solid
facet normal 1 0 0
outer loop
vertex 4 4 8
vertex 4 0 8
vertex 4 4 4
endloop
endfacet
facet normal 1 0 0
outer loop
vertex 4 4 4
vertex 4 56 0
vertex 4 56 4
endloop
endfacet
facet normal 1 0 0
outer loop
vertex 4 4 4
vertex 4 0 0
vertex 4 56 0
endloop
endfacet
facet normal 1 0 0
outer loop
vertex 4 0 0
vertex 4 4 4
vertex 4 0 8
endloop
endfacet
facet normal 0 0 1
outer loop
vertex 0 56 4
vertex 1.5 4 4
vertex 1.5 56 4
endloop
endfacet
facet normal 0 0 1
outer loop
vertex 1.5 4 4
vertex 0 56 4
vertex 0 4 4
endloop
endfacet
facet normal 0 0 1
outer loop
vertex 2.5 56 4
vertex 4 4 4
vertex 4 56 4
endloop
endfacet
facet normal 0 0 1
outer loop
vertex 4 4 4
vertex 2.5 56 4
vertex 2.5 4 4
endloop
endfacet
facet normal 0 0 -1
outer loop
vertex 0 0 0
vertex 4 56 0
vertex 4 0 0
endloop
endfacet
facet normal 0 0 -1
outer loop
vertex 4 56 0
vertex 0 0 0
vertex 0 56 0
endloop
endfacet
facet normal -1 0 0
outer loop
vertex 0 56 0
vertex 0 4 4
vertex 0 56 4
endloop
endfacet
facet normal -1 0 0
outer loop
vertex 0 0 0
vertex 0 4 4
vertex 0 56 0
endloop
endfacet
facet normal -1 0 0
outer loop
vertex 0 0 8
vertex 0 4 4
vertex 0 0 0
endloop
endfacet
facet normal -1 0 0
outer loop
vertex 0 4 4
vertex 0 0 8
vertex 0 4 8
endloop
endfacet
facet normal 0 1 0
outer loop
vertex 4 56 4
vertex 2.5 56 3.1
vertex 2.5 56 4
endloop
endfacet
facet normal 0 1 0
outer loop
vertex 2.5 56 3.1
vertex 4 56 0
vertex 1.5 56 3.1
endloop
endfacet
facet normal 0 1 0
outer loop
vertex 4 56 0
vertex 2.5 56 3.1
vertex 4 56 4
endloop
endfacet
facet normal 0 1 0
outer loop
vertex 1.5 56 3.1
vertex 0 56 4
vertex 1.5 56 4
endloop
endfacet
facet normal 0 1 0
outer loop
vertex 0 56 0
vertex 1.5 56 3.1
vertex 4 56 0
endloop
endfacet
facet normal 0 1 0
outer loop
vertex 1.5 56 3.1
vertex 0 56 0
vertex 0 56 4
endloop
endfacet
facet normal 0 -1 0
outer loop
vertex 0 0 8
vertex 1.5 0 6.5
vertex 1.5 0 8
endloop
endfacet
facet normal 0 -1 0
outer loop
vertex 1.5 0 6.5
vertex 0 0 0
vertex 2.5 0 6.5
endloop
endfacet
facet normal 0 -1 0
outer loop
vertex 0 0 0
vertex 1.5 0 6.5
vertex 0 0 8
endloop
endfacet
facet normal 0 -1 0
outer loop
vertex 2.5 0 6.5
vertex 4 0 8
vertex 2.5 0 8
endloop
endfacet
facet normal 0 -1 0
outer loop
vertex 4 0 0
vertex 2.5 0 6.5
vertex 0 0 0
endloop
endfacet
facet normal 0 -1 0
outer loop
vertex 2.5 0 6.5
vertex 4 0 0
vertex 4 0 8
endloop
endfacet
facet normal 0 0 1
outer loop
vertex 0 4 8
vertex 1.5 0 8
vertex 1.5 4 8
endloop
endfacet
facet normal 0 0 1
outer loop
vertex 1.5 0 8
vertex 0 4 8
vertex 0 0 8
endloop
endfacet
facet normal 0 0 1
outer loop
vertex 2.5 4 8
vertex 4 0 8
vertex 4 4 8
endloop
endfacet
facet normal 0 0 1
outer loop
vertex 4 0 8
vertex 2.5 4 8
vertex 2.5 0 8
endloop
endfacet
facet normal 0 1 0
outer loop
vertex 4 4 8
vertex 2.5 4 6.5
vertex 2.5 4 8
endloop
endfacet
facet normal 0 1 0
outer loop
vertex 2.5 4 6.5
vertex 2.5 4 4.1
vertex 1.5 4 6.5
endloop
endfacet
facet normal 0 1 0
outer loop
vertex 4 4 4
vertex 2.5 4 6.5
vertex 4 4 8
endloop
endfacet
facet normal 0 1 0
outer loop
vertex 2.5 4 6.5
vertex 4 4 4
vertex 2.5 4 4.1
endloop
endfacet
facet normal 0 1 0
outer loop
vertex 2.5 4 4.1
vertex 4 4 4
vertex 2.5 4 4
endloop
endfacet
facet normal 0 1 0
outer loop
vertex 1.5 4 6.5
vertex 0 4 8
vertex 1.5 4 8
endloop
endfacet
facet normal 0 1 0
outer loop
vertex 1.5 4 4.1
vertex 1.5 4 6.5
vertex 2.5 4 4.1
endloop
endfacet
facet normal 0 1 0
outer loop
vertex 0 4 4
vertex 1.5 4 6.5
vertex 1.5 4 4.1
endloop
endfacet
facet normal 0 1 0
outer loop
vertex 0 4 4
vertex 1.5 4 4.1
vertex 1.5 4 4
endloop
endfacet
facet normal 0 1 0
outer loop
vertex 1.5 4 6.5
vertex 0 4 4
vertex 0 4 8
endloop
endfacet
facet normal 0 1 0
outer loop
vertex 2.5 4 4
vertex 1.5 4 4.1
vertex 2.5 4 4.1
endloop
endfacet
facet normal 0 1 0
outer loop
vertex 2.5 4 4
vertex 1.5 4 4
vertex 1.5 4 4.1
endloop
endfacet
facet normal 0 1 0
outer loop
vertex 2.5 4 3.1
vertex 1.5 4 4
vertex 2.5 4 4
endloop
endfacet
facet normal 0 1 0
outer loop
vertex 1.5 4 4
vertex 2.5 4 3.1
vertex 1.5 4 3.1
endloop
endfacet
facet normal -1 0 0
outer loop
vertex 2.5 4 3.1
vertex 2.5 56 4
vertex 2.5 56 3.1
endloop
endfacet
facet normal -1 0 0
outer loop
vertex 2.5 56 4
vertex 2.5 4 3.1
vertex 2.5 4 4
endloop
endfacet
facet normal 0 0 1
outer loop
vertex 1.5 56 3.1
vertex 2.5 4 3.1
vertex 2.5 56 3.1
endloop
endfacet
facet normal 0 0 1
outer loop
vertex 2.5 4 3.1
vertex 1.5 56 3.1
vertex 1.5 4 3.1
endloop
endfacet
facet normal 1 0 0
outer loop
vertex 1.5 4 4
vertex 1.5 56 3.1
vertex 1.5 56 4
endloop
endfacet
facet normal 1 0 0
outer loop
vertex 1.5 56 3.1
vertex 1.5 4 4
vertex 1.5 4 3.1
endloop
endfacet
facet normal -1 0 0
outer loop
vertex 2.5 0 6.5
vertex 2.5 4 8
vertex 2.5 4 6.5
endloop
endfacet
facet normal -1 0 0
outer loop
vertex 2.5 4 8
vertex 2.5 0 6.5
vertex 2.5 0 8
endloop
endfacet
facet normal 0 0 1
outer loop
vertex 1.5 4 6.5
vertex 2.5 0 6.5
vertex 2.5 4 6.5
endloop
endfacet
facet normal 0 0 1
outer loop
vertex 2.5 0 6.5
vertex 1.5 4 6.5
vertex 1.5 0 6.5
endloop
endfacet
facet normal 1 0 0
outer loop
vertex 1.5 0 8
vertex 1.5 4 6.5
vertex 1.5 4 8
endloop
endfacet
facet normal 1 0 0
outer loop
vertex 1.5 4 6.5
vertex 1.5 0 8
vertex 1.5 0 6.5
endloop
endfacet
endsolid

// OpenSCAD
$fn=32;

thick=4;
length=56;
height=8;

difference() {
    union() {
        cube([thick,length,thick]);
        cube([thick,thick,height]);
    }
    translate([thick/2,length*1.5+thick,thick*0.9])
        cube([1,length*3,1],center=true);
    translate([thick/2,length+thick,height])
        cube([1,length*3,3],center=true);
}
